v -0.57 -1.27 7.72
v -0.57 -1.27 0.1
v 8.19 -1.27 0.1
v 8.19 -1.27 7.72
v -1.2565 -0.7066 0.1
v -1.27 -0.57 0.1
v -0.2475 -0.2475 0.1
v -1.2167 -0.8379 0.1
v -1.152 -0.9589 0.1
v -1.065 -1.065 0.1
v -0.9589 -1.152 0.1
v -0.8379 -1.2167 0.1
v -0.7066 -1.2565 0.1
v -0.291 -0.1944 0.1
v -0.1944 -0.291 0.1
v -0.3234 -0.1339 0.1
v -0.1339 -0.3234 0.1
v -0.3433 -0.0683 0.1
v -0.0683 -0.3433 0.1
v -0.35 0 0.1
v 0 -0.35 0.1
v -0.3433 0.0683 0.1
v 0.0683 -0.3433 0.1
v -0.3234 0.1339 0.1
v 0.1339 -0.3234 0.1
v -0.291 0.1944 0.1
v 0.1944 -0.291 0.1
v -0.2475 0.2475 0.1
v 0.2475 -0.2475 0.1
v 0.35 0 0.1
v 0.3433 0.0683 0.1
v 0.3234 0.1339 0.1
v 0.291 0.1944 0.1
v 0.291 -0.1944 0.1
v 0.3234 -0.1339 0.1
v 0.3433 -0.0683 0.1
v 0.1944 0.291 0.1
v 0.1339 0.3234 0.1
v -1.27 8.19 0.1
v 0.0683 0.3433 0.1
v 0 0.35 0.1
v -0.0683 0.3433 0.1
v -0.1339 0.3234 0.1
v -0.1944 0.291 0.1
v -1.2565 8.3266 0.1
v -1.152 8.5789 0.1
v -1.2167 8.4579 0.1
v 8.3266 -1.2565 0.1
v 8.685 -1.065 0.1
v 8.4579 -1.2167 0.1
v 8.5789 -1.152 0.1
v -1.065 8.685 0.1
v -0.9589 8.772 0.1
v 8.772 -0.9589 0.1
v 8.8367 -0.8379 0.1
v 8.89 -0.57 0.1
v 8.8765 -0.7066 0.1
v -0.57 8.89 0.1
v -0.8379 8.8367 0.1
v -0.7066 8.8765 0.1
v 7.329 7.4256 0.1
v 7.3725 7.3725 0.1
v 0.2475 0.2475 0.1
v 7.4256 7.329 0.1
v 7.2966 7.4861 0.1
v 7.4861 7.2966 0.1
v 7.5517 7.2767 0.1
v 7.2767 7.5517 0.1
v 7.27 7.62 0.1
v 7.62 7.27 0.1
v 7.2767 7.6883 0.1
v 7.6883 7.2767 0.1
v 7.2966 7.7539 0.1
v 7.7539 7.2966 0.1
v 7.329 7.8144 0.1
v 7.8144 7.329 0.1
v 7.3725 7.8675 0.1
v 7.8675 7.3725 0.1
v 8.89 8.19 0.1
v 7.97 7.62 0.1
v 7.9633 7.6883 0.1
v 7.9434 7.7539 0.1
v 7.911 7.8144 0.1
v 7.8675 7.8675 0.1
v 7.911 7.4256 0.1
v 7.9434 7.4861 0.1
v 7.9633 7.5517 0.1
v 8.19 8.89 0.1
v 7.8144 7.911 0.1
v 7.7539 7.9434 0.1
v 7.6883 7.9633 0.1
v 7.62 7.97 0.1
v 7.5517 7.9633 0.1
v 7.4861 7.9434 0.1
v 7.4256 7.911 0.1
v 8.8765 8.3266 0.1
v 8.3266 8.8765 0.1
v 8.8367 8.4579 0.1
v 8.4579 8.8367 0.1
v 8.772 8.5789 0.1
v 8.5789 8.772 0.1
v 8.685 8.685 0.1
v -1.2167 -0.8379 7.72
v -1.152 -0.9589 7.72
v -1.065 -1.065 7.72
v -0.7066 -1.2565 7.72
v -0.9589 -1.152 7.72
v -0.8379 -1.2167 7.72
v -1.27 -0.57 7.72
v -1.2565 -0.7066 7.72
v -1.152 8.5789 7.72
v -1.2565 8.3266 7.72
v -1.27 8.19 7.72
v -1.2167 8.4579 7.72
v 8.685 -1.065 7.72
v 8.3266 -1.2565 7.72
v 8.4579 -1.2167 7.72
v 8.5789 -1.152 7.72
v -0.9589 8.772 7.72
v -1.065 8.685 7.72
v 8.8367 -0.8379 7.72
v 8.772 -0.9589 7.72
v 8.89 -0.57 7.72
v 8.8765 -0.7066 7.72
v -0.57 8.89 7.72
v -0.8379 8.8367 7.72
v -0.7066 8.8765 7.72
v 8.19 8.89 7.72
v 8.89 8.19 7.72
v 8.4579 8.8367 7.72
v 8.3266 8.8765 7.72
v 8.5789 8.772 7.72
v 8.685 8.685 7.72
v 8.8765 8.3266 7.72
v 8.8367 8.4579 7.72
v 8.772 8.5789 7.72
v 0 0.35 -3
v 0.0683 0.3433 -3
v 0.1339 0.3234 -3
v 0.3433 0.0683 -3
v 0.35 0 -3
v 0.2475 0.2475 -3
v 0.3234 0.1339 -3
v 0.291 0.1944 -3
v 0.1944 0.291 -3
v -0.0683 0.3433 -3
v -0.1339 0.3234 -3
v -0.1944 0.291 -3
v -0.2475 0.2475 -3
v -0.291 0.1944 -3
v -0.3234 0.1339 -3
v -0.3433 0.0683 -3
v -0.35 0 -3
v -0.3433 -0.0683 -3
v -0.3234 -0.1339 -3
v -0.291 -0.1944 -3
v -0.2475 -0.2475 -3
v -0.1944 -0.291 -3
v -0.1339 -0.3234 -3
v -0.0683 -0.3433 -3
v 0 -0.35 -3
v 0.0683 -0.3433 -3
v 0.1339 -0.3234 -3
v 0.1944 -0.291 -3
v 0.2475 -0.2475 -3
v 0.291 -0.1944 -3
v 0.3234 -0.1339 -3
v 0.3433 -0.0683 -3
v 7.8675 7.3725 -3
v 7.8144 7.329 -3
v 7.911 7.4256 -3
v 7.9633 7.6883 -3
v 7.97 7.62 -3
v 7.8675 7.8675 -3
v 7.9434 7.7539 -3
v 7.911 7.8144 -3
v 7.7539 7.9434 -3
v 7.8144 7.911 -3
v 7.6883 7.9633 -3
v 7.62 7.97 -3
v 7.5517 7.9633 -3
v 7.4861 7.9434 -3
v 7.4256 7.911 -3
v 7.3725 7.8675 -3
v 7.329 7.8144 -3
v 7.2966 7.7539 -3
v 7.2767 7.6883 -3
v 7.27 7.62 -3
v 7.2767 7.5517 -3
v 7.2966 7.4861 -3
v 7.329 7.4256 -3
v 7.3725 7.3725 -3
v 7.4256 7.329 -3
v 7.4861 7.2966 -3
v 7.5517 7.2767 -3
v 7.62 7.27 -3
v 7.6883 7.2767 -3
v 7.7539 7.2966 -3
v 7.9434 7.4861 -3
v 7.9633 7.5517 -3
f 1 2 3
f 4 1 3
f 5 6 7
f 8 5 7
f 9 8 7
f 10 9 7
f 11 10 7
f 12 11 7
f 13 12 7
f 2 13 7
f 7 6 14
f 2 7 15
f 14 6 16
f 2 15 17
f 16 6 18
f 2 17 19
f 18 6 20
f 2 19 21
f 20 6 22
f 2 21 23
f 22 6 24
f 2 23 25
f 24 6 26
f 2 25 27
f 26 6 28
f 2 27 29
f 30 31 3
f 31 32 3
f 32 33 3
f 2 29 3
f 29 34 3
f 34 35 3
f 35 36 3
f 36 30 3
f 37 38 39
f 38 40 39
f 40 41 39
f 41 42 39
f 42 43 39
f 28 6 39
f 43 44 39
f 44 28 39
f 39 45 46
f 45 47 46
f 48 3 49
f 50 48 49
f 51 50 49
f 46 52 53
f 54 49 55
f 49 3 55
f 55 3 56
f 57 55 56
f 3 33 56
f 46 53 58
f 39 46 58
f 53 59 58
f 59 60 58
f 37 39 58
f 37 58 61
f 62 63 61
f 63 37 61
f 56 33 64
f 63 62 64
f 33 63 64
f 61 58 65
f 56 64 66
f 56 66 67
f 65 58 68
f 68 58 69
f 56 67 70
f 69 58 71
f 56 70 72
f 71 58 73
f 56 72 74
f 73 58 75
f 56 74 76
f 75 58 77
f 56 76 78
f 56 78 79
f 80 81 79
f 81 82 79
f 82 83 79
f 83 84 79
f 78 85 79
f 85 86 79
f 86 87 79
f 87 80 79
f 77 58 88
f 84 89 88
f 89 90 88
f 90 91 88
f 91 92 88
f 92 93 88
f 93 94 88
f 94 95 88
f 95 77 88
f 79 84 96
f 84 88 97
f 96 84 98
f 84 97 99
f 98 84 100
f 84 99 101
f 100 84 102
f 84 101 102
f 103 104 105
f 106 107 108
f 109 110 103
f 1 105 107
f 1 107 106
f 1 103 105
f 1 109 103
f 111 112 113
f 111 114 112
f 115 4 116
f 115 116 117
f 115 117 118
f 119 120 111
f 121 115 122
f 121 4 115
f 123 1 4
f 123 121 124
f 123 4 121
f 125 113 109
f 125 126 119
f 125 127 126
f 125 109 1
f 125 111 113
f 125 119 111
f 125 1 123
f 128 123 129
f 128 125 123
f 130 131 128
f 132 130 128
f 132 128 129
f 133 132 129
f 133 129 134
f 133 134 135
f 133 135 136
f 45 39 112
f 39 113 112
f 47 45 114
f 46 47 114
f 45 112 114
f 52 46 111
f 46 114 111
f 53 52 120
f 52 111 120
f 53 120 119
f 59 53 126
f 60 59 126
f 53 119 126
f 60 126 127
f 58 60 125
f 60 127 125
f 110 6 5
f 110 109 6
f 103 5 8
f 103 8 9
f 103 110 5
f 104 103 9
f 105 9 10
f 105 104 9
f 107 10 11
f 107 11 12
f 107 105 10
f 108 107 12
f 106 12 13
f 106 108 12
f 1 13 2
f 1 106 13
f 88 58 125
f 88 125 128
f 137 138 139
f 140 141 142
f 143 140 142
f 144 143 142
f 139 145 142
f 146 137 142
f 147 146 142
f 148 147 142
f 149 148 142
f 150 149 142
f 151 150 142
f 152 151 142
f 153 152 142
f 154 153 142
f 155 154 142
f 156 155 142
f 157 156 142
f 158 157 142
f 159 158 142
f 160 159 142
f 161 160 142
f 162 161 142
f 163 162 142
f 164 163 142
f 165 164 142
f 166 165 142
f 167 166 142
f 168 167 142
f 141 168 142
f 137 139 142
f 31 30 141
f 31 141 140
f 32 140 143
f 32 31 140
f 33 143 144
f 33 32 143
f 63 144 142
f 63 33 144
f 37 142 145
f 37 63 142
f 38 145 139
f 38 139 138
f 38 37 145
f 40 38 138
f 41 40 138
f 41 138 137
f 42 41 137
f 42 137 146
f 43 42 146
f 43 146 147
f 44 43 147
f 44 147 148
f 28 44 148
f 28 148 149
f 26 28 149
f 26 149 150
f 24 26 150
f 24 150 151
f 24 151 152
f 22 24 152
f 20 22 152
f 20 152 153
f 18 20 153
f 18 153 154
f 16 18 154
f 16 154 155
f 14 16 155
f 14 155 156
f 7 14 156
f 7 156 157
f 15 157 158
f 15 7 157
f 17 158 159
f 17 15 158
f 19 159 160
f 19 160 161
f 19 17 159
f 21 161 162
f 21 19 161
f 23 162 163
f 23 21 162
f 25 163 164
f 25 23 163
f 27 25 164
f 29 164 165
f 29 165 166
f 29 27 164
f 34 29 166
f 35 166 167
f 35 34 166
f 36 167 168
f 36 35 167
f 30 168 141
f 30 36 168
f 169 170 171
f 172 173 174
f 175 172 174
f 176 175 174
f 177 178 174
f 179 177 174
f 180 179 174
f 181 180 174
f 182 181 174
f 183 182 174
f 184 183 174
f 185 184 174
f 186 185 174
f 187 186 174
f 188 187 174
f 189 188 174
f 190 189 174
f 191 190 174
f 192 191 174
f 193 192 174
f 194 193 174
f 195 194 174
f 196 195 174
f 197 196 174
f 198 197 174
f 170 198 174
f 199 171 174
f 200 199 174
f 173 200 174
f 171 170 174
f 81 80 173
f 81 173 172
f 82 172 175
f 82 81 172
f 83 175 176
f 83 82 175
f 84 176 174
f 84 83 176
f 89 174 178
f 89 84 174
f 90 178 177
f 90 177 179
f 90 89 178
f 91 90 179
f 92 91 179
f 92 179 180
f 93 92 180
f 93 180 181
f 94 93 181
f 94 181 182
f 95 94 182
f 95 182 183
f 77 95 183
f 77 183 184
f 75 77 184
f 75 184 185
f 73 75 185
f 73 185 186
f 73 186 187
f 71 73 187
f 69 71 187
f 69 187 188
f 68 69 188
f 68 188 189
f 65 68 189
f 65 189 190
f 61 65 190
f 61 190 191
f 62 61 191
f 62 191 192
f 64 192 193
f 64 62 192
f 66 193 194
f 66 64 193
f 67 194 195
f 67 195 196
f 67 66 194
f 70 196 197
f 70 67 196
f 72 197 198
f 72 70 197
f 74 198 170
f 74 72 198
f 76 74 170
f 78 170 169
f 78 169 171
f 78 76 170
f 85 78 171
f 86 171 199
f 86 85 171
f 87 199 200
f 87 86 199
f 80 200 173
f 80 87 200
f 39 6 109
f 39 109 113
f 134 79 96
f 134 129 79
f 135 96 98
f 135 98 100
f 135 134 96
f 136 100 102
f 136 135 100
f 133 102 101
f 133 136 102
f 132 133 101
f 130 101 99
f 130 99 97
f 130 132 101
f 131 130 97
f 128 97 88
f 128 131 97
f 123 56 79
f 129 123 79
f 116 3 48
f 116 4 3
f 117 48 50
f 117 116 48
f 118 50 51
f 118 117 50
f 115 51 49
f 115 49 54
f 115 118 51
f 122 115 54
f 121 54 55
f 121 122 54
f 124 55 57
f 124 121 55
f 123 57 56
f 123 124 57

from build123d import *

# Parameters (mm, degrees)
SKETCH001_R  = 0.35
PAD001_DEPTH = 3.5
SKETCH_W     = 10.16
SKETCH_H     = 10.16
PAD_DEPTH    = 7.62
FILLET_R     = 0.7


with BuildPart() as pad001:
    # Sketch001 → Pad001 (new body)
    with BuildSketch(Plane.XY.offset(0.5)):
        Circle(SKETCH001_R)
        with Locations((7.62, 7.62)):
            Circle(SKETCH001_R)
    extrude(amount=-PAD001_DEPTH)


with BuildPart() as fillet_mp_cp:
    # Sketch → Pad (new body)
    with BuildSketch(Plane.XY.offset(0.1)):
        with Locations((3.81, 3.81)):
            Rectangle(SKETCH_W, SKETCH_H)
    extrude(amount=PAD_DEPTH)

    # Fillet
    fillet_edges = [fillet_mp_cp.edges().sort_by_distance(p)[0] for p in [
        (8.89, -1.27, 3.91),
        (8.89, 8.89, 3.91),
        (-1.27, -1.27, 3.91),
        (-1.27, 8.89, 3.91),
    ]]
    fillet(fillet_edges, radius=FILLET_R)

    # Fillet_mp_cp: union Pad001
    add(pad001.part)


solid = fillet_mp_cp.part
